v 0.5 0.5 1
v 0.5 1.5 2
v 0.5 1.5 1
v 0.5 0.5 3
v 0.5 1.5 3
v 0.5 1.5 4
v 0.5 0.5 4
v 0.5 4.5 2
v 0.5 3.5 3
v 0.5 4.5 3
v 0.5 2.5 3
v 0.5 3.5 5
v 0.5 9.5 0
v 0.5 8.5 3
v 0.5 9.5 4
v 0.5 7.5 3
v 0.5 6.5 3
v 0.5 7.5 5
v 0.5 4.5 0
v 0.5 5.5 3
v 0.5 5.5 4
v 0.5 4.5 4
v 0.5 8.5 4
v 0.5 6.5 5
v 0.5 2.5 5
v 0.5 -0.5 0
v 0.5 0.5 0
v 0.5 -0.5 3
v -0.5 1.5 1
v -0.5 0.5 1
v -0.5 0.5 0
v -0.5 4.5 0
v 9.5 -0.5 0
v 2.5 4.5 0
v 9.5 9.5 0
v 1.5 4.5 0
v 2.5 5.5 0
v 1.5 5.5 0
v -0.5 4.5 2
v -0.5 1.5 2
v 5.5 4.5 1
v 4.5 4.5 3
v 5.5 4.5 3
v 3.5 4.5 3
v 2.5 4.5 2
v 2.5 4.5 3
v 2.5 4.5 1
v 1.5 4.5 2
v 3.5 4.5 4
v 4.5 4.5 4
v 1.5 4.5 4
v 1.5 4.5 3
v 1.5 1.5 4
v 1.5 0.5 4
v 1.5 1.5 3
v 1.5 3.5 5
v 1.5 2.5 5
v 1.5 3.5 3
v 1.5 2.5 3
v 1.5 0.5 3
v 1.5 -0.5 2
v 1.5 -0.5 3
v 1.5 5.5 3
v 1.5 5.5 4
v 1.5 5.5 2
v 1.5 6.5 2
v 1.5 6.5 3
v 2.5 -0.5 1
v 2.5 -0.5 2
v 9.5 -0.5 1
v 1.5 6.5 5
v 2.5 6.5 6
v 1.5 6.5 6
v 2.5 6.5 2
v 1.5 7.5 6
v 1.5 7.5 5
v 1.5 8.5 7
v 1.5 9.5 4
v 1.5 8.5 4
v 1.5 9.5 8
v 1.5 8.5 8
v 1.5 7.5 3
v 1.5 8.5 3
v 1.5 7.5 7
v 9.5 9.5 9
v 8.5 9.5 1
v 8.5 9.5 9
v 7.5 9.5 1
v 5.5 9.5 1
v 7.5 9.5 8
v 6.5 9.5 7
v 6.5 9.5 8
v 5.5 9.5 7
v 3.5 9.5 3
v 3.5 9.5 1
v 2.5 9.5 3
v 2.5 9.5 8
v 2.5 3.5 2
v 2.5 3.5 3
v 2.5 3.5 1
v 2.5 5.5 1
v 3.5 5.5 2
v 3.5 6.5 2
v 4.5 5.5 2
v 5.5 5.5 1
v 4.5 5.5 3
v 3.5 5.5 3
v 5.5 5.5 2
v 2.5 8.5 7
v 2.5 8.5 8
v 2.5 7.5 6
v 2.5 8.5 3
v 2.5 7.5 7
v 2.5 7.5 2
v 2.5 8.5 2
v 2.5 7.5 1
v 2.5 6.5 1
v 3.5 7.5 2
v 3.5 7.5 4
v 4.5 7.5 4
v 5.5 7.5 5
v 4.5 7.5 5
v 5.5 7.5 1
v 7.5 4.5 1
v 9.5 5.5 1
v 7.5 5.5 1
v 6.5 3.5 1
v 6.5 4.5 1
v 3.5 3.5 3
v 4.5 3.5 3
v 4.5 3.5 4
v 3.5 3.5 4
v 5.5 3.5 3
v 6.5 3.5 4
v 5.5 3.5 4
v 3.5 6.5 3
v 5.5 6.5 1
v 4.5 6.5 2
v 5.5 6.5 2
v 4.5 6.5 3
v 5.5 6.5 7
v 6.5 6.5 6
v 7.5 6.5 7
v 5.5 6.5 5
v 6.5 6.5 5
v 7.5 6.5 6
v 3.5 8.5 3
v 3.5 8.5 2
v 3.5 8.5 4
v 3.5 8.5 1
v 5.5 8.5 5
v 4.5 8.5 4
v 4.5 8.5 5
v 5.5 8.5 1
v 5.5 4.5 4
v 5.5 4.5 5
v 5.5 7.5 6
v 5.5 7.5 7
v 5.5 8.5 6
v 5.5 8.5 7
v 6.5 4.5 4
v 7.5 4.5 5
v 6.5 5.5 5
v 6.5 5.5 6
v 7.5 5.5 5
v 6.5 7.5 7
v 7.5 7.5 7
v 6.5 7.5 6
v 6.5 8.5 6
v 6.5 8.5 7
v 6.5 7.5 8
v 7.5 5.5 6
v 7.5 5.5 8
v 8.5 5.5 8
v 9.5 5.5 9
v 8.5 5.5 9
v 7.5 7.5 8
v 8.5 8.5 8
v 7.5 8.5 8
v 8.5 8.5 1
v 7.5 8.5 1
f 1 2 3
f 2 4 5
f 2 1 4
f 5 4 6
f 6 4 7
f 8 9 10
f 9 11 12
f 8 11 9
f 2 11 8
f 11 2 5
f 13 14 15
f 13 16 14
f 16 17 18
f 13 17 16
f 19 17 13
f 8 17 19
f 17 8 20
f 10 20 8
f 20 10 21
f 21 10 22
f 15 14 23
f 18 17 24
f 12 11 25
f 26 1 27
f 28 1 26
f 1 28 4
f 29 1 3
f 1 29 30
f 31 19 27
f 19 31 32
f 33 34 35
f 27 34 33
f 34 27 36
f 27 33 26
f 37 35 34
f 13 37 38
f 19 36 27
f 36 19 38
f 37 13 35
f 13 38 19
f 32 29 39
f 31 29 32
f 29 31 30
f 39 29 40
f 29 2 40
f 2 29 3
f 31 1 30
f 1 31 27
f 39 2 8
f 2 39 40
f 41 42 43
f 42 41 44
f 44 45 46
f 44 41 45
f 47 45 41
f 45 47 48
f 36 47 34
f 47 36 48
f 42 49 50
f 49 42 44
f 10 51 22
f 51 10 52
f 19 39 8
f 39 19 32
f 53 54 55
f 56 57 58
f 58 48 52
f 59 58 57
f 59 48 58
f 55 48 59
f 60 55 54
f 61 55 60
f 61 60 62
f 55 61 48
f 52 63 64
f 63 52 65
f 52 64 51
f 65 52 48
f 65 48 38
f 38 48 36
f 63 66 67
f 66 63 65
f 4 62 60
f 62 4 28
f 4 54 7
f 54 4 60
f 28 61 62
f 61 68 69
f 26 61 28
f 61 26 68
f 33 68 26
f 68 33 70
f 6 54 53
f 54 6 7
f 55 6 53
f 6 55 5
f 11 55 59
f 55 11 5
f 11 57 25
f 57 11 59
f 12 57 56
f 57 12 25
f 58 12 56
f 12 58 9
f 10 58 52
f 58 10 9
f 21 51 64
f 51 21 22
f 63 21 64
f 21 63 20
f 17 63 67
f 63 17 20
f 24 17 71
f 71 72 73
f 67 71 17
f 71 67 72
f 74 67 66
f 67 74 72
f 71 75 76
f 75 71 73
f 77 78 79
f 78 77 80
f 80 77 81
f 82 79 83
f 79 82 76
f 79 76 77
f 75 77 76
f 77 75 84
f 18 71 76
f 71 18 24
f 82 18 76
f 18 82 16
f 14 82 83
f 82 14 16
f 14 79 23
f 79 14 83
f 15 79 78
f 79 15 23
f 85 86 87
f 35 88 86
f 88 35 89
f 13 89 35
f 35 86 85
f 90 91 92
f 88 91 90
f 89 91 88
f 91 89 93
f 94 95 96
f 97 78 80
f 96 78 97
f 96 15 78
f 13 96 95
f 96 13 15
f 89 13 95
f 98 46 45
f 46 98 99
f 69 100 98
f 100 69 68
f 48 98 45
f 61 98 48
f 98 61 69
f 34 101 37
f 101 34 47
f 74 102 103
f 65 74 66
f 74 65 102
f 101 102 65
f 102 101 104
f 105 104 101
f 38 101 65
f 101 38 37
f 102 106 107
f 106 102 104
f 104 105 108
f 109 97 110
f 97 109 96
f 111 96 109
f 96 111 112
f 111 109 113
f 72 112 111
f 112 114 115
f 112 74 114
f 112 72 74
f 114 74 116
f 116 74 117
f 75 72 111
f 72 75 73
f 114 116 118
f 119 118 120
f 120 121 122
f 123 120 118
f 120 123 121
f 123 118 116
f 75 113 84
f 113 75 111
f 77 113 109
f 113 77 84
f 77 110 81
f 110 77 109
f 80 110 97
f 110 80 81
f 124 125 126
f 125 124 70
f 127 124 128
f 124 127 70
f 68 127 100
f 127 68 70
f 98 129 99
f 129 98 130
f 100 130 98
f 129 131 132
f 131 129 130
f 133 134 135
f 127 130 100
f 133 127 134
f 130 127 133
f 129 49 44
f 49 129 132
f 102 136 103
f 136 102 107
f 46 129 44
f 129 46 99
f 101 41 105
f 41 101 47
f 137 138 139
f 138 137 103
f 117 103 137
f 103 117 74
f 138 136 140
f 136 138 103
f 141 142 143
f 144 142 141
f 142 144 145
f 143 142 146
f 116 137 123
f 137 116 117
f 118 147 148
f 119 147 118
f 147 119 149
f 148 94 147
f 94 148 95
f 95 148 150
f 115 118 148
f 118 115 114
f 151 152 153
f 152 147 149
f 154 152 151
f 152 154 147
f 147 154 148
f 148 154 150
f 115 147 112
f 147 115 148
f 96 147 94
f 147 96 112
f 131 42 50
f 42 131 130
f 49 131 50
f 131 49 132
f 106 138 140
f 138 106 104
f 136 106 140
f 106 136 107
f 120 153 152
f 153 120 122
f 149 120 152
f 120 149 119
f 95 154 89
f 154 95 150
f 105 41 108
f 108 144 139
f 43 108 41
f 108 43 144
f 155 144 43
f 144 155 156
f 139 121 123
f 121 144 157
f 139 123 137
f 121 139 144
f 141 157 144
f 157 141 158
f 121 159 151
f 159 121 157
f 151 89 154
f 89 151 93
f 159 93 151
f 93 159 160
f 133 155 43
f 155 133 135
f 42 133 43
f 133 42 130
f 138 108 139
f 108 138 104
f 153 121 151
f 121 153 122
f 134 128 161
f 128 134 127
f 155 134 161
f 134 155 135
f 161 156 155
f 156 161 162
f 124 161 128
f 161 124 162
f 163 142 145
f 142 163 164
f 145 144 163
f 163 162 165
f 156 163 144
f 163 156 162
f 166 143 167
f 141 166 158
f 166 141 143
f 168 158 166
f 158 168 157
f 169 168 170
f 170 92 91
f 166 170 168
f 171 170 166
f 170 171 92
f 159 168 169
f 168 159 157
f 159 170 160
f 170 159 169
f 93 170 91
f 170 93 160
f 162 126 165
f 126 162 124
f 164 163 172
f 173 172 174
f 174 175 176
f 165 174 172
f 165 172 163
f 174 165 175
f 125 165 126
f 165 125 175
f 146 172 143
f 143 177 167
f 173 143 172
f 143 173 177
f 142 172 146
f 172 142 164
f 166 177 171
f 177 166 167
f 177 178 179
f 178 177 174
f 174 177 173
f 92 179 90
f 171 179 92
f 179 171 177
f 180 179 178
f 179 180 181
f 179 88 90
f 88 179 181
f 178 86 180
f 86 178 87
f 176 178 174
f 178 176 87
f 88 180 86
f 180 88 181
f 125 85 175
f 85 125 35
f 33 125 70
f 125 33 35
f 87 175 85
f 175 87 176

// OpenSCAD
union() {
    translate([0, 1, 0.5]) cube([1, 1, 1], center=true);
    translate([0, 2, 1.0]) cube([1, 1, 2], center=true);
    translate([0, 3, 1.0]) cube([1, 1, 2], center=true);
    translate([0, 4, 1.0]) cube([1, 1, 2], center=true);
    translate([1, 0, 1.5]) cube([1, 1, 3], center=true);
    translate([1, 1, 2.0]) cube([1, 1, 4], center=true);
    translate([1, 2, 1.5]) cube([1, 1, 3], center=true);
    translate([1, 3, 2.5]) cube([1, 1, 5], center=true);
    translate([1, 4, 1.5]) cube([1, 1, 3], center=true);
    translate([1, 5, 2.0]) cube([1, 1, 4], center=true);
    translate([1, 6, 1.5]) cube([1, 1, 3], center=true);
    translate([1, 7, 2.5]) cube([1, 1, 5], center=true);
    translate([1, 8, 1.5]) cube([1, 1, 3], center=true);
    translate([1, 9, 2.0]) cube([1, 1, 4], center=true);
    translate([2, 0, 1.0]) cube([1, 1, 2], center=true);
    translate([2, 1, 1.0]) cube([1, 1, 2], center=true);
    translate([2, 2, 1.0]) cube([1, 1, 2], center=true);
    translate([2, 3, 1.0]) cube([1, 1, 2], center=true);
    translate([2, 4, 1.0]) cube([1, 1, 2], center=true);
    translate([2, 6, 1.0]) cube([1, 1, 2], center=true);
    translate([2, 7, 3.0]) cube([1, 1, 6], center=true);
    translate([2, 8, 3.5]) cube([1, 1, 7], center=true);
    translate([2, 9, 4.0]) cube([1, 1, 8], center=true);
    translate([3, 0, 0.5]) cube([1, 1, 1], center=true);
    translate([3, 1, 0.5]) cube([1, 1, 1], center=true);
    translate([3, 2, 0.5]) cube([1, 1, 1], center=true);
    translate([3, 3, 0.5]) cube([1, 1, 1], center=true);
    translate([3, 4, 1.5]) cube([1, 1, 3], center=true);
    translate([3, 5, 0.5]) cube([1, 1, 1], center=true);
    translate([3, 6, 1.0]) cube([1, 1, 2], center=true);
    translate([3, 7, 0.5]) cube([1, 1, 1], center=true);
    translate([3, 8, 1.0]) cube([1, 1, 2], center=true);
    translate([3, 9, 1.5]) cube([1, 1, 3], center=true);
    translate([4, 0, 0.5]) cube([1, 1, 1], center=true);
    translate([4, 1, 0.5]) cube([1, 1, 1], center=true);
    translate([4, 2, 0.5]) cube([1, 1, 1], center=true);
    translate([4, 3, 0.5]) cube([1, 1, 1], center=true);
    translate([4, 4, 2.0]) cube([1, 1, 4], center=true);
    translate([4, 5, 0.5]) cube([1, 1, 1], center=true);
    translate([4, 6, 1.5]) cube([1, 1, 3], center=true);
    translate([4, 7, 0.5]) cube([1, 1, 1], center=true);
    translate([4, 8, 2.0]) cube([1, 1, 4], center=true);
    translate([4, 9, 0.5]) cube([1, 1, 1], center=true);
    translate([5, 0, 0.5]) cube([1, 1, 1], center=true);
    translate([5, 1, 0.5]) cube([1, 1, 1], center=true);
    translate([5, 2, 0.5]) cube([1, 1, 1], center=true);
    translate([5, 3, 0.5]) cube([1, 1, 1], center=true);
    translate([5, 4, 1.5]) cube([1, 1, 3], center=true);
    translate([5, 5, 0.5]) cube([1, 1, 1], center=true);
    translate([5, 6, 1.0]) cube([1, 1, 2], center=true);
    translate([5, 7, 0.5]) cube([1, 1, 1], center=true);
    translate([5, 8, 2.5]) cube([1, 1, 5], center=true);
    translate([5, 9, 0.5]) cube([1, 1, 1], center=true);
    translate([6, 0, 0.5]) cube([1, 1, 1], center=true);
    translate([6, 1, 0.5]) cube([1, 1, 1], center=true);
    translate([6, 2, 0.5]) cube([1, 1, 1], center=true);
    translate([6, 3, 0.5]) cube([1, 1, 1], center=true);
    translate([6, 4, 2.0]) cube([1, 1, 4], center=true);
    translate([6, 5, 2.5]) cube([1, 1, 5], center=true);
    translate([6, 6, 2.5]) cube([1, 1, 5], center=true);
    translate([6, 7, 3.5]) cube([1, 1, 7], center=true);
    translate([6, 8, 3.0]) cube([1, 1, 6], center=true);
    translate([6, 9, 3.5]) cube([1, 1, 7], center=true);
    translate([7, 0, 0.5]) cube([1, 1, 1], center=true);
    translate([7, 1, 0.5]) cube([1, 1, 1], center=true);
    translate([7, 2, 0.5]) cube([1, 1, 1], center=true);
    translate([7, 3, 0.5]) cube([1, 1, 1], center=true);
    translate([7, 4, 0.5]) cube([1, 1, 1], center=true);
    translate([7, 5, 2.5]) cube([1, 1, 5], center=true);
    translate([7, 6, 3.0]) cube([1, 1, 6], center=true);
    translate([7, 7, 3.5]) cube([1, 1, 7], center=true);
    translate([7, 8, 4.0]) cube([1, 1, 8], center=true);
    translate([7, 9, 4.0]) cube([1, 1, 8], center=true);
    translate([8, 0, 0.5]) cube([1, 1, 1], center=true);
    translate([8, 1, 0.5]) cube([1, 1, 1], center=true);
    translate([8, 2, 0.5]) cube([1, 1, 1], center=true);
    translate([8, 3, 0.5]) cube([1, 1, 1], center=true);
    translate([8, 4, 0.5]) cube([1, 1, 1], center=true);
    translate([8, 5, 0.5]) cube([1, 1, 1], center=true);
    translate([8, 6, 4.0]) cube([1, 1, 8], center=true);
    translate([8, 7, 4.0]) cube([1, 1, 8], center=true);
    translate([8, 8, 4.0]) cube([1, 1, 8], center=true);
    translate([8, 9, 0.5]) cube([1, 1, 1], center=true);
    translate([9, 0, 0.5]) cube([1, 1, 1], center=true);
    translate([9, 1, 0.5]) cube([1, 1, 1], center=true);
    translate([9, 2, 0.5]) cube([1, 1, 1], center=true);
    translate([9, 3, 0.5]) cube([1, 1, 1], center=true);
    translate([9, 4, 0.5]) cube([1, 1, 1], center=true);
    translate([9, 5, 0.5]) cube([1, 1, 1], center=true);
    translate([9, 6, 4.5]) cube([1, 1, 9], center=true);
    translate([9, 7, 4.5]) cube([1, 1, 9], center=true);
    translate([9, 8, 4.5]) cube([1, 1, 9], center=true);
    translate([9, 9, 4.5]) cube([1, 1, 9], center=true);
}
